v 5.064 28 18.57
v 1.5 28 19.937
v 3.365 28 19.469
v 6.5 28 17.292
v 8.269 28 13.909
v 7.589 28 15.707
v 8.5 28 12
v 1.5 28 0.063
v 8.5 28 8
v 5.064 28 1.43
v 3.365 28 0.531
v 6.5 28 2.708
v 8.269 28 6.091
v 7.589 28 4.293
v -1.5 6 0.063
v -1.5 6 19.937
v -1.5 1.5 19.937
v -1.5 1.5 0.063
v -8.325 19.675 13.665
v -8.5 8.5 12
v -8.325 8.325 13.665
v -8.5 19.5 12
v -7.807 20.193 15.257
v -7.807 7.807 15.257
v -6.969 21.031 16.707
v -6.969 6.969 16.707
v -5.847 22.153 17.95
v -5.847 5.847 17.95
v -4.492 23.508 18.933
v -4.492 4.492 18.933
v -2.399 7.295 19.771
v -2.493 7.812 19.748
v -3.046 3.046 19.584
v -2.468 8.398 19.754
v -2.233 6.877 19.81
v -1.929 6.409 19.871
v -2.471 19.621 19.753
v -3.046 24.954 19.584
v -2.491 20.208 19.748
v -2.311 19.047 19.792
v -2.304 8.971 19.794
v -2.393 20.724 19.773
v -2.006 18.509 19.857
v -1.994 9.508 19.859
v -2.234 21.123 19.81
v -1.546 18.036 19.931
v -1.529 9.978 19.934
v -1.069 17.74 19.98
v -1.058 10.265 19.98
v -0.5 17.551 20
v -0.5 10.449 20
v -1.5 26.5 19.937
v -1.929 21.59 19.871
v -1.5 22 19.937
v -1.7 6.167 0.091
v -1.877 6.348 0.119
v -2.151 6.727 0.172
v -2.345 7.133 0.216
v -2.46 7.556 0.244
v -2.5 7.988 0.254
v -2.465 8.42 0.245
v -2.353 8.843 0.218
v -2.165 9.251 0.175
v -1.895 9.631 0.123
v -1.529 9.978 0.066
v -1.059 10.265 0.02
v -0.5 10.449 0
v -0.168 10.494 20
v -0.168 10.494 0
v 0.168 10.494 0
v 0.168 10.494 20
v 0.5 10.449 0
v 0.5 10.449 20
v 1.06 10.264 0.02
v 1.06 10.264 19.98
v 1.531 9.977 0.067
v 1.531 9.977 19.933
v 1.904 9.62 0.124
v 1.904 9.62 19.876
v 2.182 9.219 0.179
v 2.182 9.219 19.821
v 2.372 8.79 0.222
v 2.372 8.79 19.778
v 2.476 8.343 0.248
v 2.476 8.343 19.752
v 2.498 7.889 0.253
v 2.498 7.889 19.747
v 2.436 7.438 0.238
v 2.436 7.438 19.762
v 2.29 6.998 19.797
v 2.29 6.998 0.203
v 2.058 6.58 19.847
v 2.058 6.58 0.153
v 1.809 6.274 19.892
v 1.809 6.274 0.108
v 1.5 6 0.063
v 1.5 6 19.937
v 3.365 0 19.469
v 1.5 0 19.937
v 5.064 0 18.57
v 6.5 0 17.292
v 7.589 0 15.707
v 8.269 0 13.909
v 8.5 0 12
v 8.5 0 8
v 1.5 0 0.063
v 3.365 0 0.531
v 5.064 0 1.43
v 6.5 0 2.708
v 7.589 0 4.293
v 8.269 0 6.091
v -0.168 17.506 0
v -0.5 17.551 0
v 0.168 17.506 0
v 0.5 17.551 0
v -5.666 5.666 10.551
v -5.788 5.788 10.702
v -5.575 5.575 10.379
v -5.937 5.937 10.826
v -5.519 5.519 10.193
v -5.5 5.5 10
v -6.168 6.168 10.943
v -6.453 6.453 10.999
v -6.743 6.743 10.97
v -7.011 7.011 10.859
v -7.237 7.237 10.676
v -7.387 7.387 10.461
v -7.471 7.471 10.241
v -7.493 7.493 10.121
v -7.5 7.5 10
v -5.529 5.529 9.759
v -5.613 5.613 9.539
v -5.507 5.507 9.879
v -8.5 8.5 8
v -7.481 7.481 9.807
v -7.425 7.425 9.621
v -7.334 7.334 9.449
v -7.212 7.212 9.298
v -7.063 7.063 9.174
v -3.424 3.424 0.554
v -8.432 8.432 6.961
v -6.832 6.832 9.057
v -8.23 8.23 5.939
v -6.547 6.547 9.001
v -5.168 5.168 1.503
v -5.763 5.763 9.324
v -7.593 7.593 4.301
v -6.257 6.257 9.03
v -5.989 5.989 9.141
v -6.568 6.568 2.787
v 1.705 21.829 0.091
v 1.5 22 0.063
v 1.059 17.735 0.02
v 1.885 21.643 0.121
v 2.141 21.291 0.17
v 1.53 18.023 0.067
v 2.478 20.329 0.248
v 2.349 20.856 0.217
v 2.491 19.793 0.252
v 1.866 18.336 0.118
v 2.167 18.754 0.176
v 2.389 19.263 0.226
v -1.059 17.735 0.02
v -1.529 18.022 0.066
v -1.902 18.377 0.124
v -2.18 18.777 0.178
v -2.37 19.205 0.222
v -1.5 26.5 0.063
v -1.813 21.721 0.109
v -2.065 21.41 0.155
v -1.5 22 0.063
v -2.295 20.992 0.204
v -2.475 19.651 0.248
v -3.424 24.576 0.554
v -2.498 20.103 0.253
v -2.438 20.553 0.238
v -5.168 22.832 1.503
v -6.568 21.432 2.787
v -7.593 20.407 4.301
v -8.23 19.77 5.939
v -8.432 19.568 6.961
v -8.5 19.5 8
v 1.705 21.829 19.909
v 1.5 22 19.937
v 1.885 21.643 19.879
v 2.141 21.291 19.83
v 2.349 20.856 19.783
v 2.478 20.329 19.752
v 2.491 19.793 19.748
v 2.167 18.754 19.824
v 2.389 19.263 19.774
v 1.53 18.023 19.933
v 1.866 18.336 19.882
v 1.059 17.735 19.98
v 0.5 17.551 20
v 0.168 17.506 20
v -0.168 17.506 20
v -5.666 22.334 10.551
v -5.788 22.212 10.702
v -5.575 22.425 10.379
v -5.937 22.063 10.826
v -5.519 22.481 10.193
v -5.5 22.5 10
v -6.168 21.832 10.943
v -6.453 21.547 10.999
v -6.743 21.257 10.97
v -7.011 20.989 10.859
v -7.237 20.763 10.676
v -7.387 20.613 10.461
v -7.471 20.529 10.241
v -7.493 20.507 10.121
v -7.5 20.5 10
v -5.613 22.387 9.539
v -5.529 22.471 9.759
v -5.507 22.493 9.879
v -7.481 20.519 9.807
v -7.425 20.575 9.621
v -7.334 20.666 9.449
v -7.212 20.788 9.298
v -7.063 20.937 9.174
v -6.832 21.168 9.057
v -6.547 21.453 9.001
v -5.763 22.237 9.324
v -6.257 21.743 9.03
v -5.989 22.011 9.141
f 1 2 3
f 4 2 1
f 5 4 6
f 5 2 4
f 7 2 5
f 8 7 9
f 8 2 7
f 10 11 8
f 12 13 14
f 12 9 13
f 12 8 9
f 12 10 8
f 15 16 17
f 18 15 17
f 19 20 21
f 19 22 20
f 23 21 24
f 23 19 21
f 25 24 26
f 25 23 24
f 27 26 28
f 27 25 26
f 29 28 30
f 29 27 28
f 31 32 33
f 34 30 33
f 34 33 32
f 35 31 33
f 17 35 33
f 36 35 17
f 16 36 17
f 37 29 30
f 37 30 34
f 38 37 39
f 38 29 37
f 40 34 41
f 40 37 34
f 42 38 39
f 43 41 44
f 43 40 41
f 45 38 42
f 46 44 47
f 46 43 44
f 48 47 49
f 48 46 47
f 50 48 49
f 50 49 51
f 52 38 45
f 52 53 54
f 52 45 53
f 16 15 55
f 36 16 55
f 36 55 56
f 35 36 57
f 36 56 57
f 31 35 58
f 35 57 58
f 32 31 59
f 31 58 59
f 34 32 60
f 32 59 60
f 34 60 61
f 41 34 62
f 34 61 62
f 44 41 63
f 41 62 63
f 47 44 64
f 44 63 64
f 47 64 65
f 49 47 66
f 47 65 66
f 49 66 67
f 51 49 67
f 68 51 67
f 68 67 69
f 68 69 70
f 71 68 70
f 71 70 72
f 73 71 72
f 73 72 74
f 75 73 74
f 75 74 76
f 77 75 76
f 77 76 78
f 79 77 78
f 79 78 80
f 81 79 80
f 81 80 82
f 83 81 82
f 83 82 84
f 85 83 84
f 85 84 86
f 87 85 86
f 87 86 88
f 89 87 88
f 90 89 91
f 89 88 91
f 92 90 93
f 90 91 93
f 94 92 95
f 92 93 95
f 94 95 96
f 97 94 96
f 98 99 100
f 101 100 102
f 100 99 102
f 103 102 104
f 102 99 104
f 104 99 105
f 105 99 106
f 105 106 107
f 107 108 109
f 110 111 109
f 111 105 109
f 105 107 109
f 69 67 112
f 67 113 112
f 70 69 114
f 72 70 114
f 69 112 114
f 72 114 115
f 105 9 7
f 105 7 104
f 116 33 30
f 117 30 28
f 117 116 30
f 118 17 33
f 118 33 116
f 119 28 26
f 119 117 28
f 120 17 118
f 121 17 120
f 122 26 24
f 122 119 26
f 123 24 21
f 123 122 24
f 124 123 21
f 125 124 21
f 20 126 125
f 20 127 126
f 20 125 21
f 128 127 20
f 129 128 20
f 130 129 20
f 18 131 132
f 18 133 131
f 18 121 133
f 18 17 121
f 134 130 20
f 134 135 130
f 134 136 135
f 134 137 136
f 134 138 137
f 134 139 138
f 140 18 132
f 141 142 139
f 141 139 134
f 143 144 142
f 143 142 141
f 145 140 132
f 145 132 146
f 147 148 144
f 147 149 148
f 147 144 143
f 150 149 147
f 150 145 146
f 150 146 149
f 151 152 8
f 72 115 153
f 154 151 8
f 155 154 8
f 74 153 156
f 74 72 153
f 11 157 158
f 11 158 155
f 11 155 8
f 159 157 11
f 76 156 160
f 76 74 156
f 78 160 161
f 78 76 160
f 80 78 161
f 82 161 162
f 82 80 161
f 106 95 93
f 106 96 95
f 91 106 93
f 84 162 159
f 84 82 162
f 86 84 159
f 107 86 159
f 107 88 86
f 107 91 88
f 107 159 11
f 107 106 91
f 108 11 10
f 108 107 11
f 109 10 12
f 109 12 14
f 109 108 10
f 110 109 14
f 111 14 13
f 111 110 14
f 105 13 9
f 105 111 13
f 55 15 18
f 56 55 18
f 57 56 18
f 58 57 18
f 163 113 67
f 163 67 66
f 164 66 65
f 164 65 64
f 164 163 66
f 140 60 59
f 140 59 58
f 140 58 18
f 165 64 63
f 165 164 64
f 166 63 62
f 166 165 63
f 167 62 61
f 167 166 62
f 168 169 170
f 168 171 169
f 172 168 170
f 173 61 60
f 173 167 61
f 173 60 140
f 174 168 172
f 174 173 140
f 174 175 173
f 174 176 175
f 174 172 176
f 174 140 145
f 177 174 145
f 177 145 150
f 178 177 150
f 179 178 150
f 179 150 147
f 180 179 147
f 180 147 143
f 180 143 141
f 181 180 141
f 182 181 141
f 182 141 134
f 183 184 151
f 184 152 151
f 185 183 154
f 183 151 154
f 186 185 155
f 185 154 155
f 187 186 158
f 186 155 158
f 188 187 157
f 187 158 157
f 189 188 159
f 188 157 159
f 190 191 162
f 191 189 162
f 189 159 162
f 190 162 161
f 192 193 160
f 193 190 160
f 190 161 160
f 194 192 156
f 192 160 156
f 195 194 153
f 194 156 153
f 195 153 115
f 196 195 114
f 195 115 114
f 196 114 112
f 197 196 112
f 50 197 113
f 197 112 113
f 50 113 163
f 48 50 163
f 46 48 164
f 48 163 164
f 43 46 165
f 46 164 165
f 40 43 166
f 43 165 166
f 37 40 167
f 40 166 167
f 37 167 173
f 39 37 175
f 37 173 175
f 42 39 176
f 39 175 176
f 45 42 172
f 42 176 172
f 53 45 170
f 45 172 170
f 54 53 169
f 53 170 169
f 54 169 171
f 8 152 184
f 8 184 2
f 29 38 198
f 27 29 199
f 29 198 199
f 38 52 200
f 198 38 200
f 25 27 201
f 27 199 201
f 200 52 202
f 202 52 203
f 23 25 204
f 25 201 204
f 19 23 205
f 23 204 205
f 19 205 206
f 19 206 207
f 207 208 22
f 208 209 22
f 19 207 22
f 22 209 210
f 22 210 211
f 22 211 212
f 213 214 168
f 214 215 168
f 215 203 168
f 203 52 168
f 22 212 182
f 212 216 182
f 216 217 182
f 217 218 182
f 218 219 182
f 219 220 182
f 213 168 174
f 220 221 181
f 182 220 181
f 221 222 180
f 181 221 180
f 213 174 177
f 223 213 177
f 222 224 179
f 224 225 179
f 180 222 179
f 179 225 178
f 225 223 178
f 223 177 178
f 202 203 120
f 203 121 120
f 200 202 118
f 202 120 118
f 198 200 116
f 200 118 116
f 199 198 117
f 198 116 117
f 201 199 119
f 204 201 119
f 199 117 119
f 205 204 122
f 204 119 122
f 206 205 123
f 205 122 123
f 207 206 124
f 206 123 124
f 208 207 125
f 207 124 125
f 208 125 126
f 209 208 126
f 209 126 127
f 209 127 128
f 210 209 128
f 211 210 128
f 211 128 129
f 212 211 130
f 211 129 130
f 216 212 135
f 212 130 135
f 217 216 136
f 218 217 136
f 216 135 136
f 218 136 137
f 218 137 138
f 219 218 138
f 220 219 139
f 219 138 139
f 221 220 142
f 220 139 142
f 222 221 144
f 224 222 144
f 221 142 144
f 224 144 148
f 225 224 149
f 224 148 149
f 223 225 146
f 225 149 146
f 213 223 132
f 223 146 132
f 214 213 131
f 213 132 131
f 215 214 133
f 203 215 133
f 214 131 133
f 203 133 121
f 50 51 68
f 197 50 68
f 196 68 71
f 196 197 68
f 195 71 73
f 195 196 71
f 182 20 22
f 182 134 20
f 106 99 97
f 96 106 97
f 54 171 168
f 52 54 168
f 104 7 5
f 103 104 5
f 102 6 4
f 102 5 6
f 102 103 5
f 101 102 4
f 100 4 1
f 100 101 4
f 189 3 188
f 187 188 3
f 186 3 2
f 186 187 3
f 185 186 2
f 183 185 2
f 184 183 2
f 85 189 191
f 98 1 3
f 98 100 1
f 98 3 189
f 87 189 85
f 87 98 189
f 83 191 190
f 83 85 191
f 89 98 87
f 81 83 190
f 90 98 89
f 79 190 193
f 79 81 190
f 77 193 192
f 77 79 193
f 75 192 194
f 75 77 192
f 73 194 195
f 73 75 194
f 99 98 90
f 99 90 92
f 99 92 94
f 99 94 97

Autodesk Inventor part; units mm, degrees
ref_plane "YZ Plane" through (0, 0, 0) normal (1, 0, 0) x (0, 1, 0)
ref_plane "XZ Plane" through (0, 0, 0) normal (0, 1, 0) x (-1, 0, 0)
ref_plane "XY Plane" through (0, 0, 0) normal (0, 0, 1) x (1, 0, 0)
sketch "Sketch1" plane through (0, 0, 0) normal (0, 0, 1) x (1, 0, 0)
  line L0 (0, 0) -> (2.5, 0)
  line L1 (2.5, 0) -> (2.5, 28)
  line L2 (2.5, 28) -> (-2.5, 28)
  line L3 (-2.5, 28) -> (-2.5, 0)
  circle A0 centre (0, 0) radius 8.5
  line L4 (0, 28) -> (8.5, 28) construction
  circle A1 centre (0, 28) radius 8.5
  line L5 (-8.5, 0) -> (-8.5, 28)
  line L6 (8.5, 28) -> (8.5, 0)
  line L7 (0, 28) -> (8.5, 28)
  line L8 (0, 28) -> (-8.5, 19.5)
  line L9 (0, 28) -> (12.0208, 28) construction
  line L10 (0, 0) -> (8.5, 0)
  line L11 (0, 0) -> (-8.5, 8.5)
  line L12 (0, 0) -> (12.0208, 0) construction
  dimension "d9" = 17
  dimension "d1" = 2.5
  dimension "d2" = 28
  dimension "d3" = 5
  dimension "d5" = 17
  dimension "d10" = 2.5
  dimension "d11" = 0
  dimension "d12" = 135
  dimension "d13" = 135
extrude "Extrusion1" add sketch "Sketch1" along normal blind 20 contours L11 L3 A0 L1 L0 | L1 A0 L10 | L11 A0 L3 | A0 L3 A1 L1 | L1 A1 L6 A0 | A0 L11 L5 L8 A1 L3 | A1 L3 L8 L2 L1 | L1 L7 A1 | A1 L8 L3
sketch "Sketch2" plane through (0, 0, 0) normal (0, 0, -1) x (-1, 0, 0)
  line L0 (0, 0) -> (-8.5, 0) projected
  line L1 (0, 0) -> (0, 8)
  circle A0 centre (0, 8) radius 2.5
  line L2 (8.5, 8.5) -> (0, 0) projected
  line L3 (0, 0) -> (-1.5, 0)
  line L4 (-1.5, 0) -> (-1.5, 8)
  line L5 (-1.5, 8) -> (1.5, 8)
  line L6 (1.5, 8) -> (1.5, 0)
  line L7 (1.5, 0) -> (0, 0)
  line L8 (0, 28) -> (8.5, 19.5) projected
  line L9 (0, 28) -> (0, 20)
  line L10 (0, 20) -> (-1.5, 20)
  line L11 (-1.5, 20) -> (-1.5, 28)
  line L12 (-8.5, 28) -> (0, 28) projected
  line L13 (0, 20) -> (1.5, 20)
  line L14 (1.5, 20) -> (1.5, 28)
  line L15 (1.5, 28) -> (0, 28)
  circle A1 centre (0, 20) radius 2.5
  point P0 (1.5, 45)
  point P1 (-1.5, 22)
  point P2 (1.5, 22)
  point P3 (-1.5, 6)
  point P4 (1.5, 6)
  dimension "d16" = 8
  dimension "d17" = 5
  dimension "d18" = 1.5
  dimension "d19" = 3
  dimension "d20" = 8
  dimension "d21" = 1.5
  dimension "d22" = 1.5
  dimension "d23" = 5
extrude "Extrusion2" cut sketch "Sketch2" against normal through all
fillet "Fillet1" radius 8 4 edges at (8.5, 14, 0) (8.5, 14, 20) (-8.5, 14, 0) (-8.5, 14, 20)
sketch "Sketch4" plane through (1.5, 0, 0.0627) normal (0, -1, 0) x (1, 0, 0)
  line L0 (-10, 7.9373) -> (-10, 11.9373) projected
  line L1 (-10, 9.9373) -> (-8, 9.9373)
  circle A0 centre (-8, 9.9373) radius 1
  point P0 (-1.5, -0.0627)
  dimension "d31" = 2
  dimension "d32" = 2
extrude "Extrusion4" cut sketch "Sketch4" against normal through all
properties part number "ring_f2"
